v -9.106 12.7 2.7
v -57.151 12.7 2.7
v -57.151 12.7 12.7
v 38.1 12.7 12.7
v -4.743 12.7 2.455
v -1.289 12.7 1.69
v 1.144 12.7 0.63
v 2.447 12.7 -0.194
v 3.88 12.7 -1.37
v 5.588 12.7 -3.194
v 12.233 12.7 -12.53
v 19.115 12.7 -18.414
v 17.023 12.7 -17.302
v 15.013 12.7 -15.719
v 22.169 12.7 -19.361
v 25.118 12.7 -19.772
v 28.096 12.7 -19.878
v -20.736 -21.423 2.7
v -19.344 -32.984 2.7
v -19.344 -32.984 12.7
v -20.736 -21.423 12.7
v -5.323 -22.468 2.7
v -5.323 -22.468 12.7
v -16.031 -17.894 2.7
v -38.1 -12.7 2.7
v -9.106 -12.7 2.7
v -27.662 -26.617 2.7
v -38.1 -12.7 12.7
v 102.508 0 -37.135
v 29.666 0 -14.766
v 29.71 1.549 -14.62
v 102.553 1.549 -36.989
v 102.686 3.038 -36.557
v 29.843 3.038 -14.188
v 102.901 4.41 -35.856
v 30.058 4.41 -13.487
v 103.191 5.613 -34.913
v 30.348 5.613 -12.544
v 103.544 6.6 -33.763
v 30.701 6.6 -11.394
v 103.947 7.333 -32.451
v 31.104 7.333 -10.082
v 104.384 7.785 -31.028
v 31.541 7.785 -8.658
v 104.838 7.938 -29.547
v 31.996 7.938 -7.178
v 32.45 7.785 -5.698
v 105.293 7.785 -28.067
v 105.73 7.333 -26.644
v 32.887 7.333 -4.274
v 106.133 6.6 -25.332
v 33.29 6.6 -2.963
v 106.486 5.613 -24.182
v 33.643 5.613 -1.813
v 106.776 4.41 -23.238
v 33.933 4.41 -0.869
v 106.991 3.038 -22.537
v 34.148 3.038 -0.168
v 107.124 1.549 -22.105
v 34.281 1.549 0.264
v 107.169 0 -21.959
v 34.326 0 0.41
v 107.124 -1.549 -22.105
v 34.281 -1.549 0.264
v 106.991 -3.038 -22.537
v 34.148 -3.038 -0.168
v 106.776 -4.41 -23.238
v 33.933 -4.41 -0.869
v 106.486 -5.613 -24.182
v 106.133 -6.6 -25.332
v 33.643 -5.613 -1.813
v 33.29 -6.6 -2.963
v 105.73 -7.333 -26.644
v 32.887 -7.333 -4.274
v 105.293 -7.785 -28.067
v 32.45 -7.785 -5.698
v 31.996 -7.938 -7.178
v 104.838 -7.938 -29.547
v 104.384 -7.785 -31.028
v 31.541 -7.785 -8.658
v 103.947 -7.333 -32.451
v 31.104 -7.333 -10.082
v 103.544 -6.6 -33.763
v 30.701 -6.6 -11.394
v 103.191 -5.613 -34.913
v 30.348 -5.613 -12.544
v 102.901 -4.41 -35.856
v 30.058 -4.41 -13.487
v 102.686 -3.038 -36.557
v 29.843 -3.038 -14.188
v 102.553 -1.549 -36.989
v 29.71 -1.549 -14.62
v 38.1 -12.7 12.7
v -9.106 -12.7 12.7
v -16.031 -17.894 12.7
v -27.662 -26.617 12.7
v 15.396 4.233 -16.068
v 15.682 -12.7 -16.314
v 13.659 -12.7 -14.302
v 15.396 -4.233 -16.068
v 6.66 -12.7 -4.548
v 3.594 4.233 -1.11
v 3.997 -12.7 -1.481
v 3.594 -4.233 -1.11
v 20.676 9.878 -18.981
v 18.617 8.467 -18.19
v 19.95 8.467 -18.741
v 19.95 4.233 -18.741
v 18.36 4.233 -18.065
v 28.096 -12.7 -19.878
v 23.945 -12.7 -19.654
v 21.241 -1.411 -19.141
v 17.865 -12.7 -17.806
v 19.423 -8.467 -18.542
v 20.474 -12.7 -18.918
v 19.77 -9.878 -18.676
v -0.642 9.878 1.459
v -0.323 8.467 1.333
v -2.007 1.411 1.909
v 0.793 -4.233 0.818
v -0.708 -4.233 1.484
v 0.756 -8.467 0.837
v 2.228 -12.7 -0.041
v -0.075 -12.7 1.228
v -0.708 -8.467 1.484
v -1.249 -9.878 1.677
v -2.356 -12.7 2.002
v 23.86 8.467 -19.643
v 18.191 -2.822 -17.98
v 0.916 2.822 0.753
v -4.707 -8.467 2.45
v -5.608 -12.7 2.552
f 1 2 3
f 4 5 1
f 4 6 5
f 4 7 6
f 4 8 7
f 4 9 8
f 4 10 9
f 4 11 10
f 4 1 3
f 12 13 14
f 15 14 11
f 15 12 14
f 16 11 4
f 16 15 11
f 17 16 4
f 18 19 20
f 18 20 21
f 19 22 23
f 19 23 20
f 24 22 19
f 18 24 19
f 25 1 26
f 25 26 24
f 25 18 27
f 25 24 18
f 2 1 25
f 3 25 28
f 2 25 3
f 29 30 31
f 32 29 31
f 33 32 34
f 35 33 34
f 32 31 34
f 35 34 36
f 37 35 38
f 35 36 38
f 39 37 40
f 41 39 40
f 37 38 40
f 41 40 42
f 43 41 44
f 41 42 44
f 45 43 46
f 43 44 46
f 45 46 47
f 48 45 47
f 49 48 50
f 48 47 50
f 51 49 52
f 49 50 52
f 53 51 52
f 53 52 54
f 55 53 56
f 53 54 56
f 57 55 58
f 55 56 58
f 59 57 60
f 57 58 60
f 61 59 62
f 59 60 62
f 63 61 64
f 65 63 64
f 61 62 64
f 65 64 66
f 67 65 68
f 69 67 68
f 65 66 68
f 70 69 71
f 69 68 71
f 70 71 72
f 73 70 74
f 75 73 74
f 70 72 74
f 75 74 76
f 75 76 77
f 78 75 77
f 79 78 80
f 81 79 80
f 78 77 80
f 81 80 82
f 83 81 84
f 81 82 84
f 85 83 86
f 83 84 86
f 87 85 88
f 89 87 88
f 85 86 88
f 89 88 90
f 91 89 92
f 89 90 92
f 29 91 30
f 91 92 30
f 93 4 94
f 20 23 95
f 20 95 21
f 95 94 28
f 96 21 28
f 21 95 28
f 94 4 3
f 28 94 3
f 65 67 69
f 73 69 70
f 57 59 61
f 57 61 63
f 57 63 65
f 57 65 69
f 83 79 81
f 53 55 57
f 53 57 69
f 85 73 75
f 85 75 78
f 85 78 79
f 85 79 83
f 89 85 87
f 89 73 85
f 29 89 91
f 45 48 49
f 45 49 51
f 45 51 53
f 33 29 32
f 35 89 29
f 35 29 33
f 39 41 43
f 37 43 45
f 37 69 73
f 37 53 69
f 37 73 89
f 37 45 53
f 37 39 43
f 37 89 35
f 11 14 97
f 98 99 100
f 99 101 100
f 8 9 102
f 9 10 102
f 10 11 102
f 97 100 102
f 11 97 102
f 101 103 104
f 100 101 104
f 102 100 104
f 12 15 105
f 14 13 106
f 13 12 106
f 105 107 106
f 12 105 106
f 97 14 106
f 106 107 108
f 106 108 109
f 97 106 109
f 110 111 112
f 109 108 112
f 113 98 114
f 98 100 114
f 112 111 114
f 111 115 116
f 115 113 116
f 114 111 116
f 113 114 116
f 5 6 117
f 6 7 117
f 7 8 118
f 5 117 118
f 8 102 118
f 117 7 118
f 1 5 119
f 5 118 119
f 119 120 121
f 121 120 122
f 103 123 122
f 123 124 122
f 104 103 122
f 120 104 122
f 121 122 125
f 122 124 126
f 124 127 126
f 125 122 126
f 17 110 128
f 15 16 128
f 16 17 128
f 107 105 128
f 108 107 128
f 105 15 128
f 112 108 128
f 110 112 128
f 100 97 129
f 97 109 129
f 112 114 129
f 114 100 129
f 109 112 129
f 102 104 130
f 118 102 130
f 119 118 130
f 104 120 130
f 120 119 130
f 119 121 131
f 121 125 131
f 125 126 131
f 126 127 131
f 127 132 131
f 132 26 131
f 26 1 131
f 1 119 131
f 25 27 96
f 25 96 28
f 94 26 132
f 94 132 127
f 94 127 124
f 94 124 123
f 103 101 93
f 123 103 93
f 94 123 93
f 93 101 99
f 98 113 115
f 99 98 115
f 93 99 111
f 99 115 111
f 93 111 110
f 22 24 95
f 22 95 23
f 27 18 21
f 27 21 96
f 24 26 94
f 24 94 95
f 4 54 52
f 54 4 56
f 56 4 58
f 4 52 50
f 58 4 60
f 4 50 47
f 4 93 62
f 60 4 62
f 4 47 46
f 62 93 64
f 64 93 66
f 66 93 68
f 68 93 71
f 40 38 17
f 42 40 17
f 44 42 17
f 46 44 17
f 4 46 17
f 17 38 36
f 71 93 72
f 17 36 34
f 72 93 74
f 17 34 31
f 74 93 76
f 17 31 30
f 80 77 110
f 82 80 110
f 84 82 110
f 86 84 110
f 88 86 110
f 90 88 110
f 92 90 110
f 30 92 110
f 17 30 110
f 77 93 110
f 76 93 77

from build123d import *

# Parameters (mm, degrees)
BOSS_EXTRUDE1_DEPTH      = 12.7
BOSS_EXTRUDE1_DEPTH_BACK = 19.878167
SKETCH1_W                = 76.2
SKETCH1_H                = 25.4
CUT_EXTRUDE1_DEPTH       = 50.919049703
SKETCH4_R                = 7.9375
BOSS_EXTRUDE2_DEPTH      = 76.2
BOSS_EXTRUDE3_DEPTH      = 10


with BuildPart() as part:
    # Sketch1 → Boss-Extrude1 (new, two sides: drawn at the far end of the back side and taken through both)
    with BuildSketch(Plane.XY.offset(-BOSS_EXTRUDE1_DEPTH_BACK)):
        Rectangle(SKETCH1_W, SKETCH1_H)
    extrude(amount=BOSS_EXTRUDE1_DEPTH + BOSS_EXTRUDE1_DEPTH_BACK)

    # Sketch2 → Cut-Extrude1 (cut, through all)
    with BuildSketch(Plane.XZ.offset(12.7)):
        Polygon((33.097822487, -3.5890835), (28.095644974, -19.878167), (30.299971912, -19.878167), (38.1, -19.878167), (38.1, -5.125190787), align=None)
        Polygon((38.1, 12.7), (33.097822487, -3.5890835), (38.1, -5.125190787), align=None)
        with BuildLine():
            Line((28.095644974, -19.878167), (-38.1, -19.878167))
            Line((-38.1, -19.878167), (-38.1, 2.7))
            Line((-38.1, 2.7), (-9.105646135, 2.7))
            add(Edge.make_bspline(
                [(28.095644974, -19.878167), (23.262476233, -19.878167), (13.759725723, -18.38827049), (5.19295176, 1.21010349), (-4.185142014, 2.7), (-9.105646135, 2.7)],
                knots=[0, 0, 0, 0, 0.311689084, 0.688310916, 1, 1, 1, 1], degree=3))
        make_face()
    extrude(amount=-CUT_EXTRUDE1_DEPTH, mode=Mode.SUBTRACT)

    # Sketch4 → Boss-Extrude2 (add)
    with BuildSketch(Plane(origin=(31.252760971, 0, -9.59733911), x_dir=(-0.2935578385035089, 0, -0.95594131381228), z_dir=(0.95594131381228, 0, -0.2935578385035089))):
        with Locations((-2.530674188, 0)):
            Circle(SKETCH4_R)
    extrude(amount=BOSS_EXTRUDE2_DEPTH)

    # Sketch5 → Boss-Extrude3 (add)
    with BuildSketch(Plane(origin=(0, 0, 2.7), x_dir=(-1, 0, 0), z_dir=(0, 0, -1))):
        Polygon((38.1, 12.7), (38.1, -12.7), (57.150604496, 12.7), align=None)
        Polygon((27.661608652, -26.617413502), (38.1, -12.7), (9.105646135, -12.7), (16.030761987, -17.894001701), (5.322904607, -22.467747821), (19.34354444, -32.983561373), (20.7364928, -21.423411802), align=None)
    extrude(amount=-BOSS_EXTRUDE3_DEPTH)


solid = part.part
